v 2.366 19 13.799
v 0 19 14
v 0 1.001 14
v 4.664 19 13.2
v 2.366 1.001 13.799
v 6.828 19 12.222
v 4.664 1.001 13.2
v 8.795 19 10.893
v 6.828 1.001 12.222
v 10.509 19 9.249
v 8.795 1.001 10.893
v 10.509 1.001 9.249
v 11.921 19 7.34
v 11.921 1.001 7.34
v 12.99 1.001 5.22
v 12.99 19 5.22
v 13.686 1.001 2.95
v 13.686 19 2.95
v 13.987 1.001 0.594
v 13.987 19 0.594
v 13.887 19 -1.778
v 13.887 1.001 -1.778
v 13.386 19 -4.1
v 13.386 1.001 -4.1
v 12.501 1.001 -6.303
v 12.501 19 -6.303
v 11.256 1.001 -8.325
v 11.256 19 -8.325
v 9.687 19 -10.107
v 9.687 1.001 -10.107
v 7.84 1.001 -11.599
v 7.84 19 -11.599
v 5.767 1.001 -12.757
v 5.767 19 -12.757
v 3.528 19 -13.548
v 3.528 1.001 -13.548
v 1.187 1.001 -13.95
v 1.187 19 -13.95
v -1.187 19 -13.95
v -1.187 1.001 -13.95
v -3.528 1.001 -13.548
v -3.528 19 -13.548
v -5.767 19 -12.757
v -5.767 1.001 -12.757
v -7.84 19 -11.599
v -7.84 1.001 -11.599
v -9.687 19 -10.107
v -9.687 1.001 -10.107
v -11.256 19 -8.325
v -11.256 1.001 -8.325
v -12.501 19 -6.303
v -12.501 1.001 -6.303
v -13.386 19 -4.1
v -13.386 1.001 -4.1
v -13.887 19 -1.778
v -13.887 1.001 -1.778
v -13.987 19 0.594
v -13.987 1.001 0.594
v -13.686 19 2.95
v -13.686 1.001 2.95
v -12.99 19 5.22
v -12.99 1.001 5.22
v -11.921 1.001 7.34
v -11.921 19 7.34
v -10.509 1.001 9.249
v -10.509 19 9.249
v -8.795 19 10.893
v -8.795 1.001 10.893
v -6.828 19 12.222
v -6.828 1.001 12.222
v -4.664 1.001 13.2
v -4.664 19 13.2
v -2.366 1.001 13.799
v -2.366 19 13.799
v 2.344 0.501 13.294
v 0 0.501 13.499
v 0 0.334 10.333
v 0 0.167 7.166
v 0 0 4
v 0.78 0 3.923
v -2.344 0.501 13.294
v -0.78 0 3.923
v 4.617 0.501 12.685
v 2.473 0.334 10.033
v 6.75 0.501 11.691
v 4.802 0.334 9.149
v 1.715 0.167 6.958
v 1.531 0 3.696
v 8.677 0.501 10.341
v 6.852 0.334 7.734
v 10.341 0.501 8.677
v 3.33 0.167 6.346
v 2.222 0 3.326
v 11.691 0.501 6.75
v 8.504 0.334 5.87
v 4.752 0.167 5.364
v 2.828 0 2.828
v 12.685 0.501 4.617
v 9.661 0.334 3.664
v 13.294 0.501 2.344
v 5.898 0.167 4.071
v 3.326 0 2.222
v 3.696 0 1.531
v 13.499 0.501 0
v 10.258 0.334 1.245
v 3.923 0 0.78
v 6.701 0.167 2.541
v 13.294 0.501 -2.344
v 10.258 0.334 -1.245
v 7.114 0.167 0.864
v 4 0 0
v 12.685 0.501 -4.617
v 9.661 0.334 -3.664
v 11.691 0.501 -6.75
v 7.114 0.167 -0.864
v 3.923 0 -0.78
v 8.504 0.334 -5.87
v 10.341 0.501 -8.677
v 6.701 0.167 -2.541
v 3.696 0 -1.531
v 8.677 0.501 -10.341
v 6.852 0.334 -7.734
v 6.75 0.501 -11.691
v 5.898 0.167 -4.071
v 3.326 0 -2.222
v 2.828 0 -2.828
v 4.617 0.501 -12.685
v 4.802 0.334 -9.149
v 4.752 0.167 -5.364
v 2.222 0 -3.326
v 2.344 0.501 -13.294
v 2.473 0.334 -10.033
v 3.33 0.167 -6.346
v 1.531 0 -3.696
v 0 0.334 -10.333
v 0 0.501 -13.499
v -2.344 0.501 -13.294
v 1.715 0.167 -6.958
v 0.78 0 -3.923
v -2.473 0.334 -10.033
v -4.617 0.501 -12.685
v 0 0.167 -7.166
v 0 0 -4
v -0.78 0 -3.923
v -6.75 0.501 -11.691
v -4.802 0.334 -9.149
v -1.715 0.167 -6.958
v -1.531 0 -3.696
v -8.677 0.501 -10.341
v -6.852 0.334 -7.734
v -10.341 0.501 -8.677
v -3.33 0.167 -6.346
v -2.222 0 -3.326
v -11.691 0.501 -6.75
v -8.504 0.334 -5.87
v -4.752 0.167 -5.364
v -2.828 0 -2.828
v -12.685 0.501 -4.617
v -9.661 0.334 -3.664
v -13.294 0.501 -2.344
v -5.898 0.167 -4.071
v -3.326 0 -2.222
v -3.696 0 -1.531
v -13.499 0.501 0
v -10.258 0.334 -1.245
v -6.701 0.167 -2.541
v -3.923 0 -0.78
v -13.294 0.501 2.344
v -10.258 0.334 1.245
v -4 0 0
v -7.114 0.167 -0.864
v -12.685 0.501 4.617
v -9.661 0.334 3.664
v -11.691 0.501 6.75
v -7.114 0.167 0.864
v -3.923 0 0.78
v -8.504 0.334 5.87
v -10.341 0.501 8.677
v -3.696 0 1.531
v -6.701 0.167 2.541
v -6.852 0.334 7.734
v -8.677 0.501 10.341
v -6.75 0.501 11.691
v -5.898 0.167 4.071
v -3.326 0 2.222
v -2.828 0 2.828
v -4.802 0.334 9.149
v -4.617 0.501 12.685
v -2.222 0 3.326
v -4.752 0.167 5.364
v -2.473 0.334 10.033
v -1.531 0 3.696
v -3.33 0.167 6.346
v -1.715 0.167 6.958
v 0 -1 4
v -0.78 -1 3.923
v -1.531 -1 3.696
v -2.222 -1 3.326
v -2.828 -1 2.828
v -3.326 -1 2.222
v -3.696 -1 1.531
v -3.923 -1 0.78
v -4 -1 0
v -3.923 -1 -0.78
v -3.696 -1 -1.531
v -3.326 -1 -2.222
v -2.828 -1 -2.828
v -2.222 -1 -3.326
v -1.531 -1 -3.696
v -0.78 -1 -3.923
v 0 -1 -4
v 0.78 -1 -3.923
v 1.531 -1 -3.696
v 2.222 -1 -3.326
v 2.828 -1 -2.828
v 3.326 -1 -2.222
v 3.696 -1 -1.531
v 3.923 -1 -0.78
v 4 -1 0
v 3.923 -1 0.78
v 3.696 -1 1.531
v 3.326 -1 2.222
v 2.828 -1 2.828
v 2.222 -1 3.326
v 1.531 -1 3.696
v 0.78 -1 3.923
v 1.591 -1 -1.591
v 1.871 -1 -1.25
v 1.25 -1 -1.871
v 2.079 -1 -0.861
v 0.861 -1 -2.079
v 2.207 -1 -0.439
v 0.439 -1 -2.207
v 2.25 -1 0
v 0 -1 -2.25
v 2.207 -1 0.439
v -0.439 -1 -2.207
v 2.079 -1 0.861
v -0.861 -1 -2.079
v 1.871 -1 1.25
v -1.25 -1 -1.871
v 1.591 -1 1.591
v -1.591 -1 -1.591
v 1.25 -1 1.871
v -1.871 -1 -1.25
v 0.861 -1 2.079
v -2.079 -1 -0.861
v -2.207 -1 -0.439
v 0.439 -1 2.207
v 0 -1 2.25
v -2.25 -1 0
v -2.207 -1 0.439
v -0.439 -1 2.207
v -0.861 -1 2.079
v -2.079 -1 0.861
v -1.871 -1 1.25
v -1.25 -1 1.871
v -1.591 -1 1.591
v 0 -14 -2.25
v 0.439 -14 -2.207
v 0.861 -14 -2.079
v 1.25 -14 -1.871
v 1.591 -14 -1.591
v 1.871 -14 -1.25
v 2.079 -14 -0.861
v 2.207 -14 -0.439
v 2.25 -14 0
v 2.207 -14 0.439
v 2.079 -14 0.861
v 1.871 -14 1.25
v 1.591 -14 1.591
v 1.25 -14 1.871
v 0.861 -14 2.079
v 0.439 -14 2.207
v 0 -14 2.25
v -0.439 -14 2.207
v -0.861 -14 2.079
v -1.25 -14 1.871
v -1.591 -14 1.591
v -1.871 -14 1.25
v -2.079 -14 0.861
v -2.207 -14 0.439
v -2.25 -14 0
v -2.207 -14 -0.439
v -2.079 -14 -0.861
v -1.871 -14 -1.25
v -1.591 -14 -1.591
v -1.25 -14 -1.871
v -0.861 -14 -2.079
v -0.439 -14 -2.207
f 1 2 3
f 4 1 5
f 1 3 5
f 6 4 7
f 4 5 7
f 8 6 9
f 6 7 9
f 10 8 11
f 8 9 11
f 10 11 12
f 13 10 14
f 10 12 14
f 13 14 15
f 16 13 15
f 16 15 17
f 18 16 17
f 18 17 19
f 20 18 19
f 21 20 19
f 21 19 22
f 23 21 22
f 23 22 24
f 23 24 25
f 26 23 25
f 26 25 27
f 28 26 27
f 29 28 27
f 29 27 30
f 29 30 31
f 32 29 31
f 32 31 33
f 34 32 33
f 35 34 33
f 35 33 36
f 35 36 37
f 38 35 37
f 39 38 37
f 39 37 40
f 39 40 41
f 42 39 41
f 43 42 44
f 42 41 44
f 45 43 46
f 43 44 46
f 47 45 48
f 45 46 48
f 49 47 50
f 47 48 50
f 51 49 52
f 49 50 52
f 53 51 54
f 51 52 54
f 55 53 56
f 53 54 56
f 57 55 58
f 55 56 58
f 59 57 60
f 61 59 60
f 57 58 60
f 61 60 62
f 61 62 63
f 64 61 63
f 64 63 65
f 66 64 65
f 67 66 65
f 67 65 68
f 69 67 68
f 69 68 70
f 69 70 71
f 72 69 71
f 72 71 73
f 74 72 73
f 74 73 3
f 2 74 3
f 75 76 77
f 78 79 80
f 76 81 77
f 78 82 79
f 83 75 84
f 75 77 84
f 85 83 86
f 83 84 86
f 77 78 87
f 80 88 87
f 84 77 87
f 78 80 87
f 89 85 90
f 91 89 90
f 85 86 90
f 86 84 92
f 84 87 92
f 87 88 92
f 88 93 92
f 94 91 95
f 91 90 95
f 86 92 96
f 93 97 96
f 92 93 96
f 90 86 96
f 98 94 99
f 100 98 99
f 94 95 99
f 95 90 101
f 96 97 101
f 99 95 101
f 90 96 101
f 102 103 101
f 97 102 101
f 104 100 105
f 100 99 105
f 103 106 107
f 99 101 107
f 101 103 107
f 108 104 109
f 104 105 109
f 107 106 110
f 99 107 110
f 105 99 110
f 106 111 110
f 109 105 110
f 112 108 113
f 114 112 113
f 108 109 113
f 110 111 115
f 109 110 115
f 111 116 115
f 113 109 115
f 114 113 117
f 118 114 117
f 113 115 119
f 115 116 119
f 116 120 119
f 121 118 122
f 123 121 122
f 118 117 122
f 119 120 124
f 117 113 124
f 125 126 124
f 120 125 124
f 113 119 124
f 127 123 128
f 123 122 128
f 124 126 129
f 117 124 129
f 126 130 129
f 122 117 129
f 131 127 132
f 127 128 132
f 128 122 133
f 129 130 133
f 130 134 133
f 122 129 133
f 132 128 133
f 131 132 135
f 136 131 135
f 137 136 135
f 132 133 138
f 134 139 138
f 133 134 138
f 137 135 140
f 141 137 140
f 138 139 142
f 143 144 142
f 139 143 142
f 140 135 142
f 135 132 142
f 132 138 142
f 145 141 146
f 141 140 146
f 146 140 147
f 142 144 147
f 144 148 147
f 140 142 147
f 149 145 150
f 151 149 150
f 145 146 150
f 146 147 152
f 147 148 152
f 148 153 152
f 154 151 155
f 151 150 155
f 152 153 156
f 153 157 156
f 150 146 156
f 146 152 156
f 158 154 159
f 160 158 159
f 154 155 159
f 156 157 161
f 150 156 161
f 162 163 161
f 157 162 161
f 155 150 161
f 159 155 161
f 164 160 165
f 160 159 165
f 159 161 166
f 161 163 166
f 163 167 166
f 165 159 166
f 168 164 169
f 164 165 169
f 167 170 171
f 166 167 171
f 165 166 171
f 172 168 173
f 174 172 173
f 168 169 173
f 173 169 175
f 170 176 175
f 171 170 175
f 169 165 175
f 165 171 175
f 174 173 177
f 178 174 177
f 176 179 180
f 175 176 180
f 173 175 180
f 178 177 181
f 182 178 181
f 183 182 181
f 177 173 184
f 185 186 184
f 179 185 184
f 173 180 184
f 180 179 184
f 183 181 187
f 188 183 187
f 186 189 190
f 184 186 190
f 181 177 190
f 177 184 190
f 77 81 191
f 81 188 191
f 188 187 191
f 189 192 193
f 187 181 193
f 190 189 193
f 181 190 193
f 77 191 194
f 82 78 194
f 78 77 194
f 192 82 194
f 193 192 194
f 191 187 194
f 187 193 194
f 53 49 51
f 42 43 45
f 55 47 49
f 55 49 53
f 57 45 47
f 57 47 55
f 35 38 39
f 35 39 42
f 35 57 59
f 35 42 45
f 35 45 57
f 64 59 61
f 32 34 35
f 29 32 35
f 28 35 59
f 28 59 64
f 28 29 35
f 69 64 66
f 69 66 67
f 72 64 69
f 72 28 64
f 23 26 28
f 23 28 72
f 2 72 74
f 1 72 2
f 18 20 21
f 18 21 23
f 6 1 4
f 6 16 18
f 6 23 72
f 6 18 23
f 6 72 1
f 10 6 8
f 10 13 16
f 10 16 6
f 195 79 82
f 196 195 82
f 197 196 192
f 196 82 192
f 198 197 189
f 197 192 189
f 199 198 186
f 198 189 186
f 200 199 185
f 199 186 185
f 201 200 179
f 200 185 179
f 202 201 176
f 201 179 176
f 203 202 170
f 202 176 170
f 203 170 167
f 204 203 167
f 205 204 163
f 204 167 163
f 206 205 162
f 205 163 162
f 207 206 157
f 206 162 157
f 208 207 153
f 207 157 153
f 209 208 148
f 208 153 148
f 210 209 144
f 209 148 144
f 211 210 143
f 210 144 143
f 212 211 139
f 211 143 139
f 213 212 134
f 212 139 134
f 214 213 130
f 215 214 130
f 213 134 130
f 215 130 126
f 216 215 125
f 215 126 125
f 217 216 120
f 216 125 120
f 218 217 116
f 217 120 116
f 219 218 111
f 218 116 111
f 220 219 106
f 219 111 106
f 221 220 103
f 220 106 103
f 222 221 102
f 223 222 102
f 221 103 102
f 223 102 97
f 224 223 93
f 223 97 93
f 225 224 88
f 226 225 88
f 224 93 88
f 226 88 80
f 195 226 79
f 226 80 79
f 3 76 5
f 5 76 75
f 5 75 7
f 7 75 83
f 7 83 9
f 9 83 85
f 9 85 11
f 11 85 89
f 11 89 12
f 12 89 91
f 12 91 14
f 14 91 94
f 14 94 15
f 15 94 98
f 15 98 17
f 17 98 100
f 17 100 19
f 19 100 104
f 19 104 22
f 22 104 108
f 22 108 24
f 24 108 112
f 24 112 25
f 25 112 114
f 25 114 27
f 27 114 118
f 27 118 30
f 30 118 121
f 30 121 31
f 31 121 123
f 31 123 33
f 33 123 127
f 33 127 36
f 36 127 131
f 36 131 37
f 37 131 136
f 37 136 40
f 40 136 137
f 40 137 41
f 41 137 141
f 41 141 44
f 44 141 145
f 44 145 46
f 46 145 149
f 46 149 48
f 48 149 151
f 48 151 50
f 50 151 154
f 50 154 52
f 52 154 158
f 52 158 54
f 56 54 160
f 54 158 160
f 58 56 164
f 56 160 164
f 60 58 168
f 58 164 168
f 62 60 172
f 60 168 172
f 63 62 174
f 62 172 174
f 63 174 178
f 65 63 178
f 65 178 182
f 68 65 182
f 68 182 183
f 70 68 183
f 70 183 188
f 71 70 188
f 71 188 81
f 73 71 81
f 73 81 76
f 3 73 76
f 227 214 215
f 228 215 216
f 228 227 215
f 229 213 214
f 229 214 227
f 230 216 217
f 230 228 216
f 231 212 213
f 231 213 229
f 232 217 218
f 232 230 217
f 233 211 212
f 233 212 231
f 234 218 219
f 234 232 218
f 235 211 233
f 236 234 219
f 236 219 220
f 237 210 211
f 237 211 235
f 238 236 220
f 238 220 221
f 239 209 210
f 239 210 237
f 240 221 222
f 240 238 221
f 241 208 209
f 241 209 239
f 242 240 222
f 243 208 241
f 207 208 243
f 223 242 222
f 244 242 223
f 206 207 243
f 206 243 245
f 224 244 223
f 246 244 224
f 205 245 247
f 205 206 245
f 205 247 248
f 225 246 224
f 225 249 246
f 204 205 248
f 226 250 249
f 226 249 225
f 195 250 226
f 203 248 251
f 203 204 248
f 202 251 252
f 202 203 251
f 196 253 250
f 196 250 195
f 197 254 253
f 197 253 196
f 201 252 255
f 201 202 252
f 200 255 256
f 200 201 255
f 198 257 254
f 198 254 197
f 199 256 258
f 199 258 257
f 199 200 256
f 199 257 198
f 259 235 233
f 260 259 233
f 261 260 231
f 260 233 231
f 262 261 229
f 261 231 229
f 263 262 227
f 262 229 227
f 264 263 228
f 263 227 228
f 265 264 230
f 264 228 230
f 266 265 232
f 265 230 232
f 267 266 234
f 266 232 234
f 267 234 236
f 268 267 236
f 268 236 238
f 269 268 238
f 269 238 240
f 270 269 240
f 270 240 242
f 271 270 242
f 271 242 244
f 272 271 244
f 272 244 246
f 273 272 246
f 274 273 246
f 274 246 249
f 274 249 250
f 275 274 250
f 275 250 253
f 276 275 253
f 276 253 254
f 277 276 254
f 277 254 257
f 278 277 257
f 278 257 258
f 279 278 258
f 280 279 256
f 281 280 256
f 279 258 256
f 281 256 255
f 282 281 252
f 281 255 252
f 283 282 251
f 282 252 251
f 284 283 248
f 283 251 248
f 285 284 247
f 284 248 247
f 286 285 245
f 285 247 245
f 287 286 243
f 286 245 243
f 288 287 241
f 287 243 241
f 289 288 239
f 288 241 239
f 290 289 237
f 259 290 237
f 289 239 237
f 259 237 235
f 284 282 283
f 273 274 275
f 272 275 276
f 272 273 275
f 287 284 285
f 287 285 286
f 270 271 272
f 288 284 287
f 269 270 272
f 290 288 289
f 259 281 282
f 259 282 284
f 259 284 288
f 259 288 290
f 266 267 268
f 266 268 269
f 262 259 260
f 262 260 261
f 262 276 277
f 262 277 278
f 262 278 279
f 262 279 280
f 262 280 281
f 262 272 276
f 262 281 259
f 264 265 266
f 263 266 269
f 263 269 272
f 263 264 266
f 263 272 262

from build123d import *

# Parameters (mm, degrees)
SKETCH1_R           = 14
BOSS_EXTRUDE4_DEPTH = 19
SKETCH7_R           = 2.25
BOSS_EXTRUDE5_DEPTH = 14
SKETCH9_R           = 4
BOSS_EXTRUDE8_DEPTH = 1


with BuildPart() as part:
    # Sketch1 → Boss-Extrude4 (new body)
    with BuildSketch(Plane(origin=(0, 0, 0), x_dir=(1, 0, 0), z_dir=(0, 1, 0))):
        with Locations(Location((0, 0, 0), (0, 0, 270))):
            Circle(SKETCH1_R)
    extrude(amount=BOSS_EXTRUDE4_DEPTH)

    # Sketch7 → Boss-Extrude5 (add)
    with BuildSketch(Plane.XZ):
        with Locations(Location((0, 0, 0), (0, 0, 270))):
            Circle(SKETCH7_R)
    extrude(amount=BOSS_EXTRUDE5_DEPTH)

    # Sketch9 → Boss-Extrude8 (add)
    with BuildSketch(Plane.XZ):
        with Locations(Location((0, 0, 0), (0, 0, 90))):
            Circle(SKETCH9_R)
    extrude(amount=BOSS_EXTRUDE8_DEPTH)

    # Sketch10 → Cut-Revolve9 (revolve, cut)
    with BuildSketch(Plane.XY, mode=Mode.PRIVATE) as cut_revolve9_sk:
        Polygon((-4, 0), (-14, 0), (-14, 1.001232808), (-13.499383596, 0.500616404), align=None)
    revolve(cut_revolve9_sk.sketch.rotate(Axis((0, 0.500616404, 0), (0, 1, 0)), 90), axis=Axis((0, 0.500616404, 0), (0, 1, 0)), mode=Mode.SUBTRACT)


solid = part.part
